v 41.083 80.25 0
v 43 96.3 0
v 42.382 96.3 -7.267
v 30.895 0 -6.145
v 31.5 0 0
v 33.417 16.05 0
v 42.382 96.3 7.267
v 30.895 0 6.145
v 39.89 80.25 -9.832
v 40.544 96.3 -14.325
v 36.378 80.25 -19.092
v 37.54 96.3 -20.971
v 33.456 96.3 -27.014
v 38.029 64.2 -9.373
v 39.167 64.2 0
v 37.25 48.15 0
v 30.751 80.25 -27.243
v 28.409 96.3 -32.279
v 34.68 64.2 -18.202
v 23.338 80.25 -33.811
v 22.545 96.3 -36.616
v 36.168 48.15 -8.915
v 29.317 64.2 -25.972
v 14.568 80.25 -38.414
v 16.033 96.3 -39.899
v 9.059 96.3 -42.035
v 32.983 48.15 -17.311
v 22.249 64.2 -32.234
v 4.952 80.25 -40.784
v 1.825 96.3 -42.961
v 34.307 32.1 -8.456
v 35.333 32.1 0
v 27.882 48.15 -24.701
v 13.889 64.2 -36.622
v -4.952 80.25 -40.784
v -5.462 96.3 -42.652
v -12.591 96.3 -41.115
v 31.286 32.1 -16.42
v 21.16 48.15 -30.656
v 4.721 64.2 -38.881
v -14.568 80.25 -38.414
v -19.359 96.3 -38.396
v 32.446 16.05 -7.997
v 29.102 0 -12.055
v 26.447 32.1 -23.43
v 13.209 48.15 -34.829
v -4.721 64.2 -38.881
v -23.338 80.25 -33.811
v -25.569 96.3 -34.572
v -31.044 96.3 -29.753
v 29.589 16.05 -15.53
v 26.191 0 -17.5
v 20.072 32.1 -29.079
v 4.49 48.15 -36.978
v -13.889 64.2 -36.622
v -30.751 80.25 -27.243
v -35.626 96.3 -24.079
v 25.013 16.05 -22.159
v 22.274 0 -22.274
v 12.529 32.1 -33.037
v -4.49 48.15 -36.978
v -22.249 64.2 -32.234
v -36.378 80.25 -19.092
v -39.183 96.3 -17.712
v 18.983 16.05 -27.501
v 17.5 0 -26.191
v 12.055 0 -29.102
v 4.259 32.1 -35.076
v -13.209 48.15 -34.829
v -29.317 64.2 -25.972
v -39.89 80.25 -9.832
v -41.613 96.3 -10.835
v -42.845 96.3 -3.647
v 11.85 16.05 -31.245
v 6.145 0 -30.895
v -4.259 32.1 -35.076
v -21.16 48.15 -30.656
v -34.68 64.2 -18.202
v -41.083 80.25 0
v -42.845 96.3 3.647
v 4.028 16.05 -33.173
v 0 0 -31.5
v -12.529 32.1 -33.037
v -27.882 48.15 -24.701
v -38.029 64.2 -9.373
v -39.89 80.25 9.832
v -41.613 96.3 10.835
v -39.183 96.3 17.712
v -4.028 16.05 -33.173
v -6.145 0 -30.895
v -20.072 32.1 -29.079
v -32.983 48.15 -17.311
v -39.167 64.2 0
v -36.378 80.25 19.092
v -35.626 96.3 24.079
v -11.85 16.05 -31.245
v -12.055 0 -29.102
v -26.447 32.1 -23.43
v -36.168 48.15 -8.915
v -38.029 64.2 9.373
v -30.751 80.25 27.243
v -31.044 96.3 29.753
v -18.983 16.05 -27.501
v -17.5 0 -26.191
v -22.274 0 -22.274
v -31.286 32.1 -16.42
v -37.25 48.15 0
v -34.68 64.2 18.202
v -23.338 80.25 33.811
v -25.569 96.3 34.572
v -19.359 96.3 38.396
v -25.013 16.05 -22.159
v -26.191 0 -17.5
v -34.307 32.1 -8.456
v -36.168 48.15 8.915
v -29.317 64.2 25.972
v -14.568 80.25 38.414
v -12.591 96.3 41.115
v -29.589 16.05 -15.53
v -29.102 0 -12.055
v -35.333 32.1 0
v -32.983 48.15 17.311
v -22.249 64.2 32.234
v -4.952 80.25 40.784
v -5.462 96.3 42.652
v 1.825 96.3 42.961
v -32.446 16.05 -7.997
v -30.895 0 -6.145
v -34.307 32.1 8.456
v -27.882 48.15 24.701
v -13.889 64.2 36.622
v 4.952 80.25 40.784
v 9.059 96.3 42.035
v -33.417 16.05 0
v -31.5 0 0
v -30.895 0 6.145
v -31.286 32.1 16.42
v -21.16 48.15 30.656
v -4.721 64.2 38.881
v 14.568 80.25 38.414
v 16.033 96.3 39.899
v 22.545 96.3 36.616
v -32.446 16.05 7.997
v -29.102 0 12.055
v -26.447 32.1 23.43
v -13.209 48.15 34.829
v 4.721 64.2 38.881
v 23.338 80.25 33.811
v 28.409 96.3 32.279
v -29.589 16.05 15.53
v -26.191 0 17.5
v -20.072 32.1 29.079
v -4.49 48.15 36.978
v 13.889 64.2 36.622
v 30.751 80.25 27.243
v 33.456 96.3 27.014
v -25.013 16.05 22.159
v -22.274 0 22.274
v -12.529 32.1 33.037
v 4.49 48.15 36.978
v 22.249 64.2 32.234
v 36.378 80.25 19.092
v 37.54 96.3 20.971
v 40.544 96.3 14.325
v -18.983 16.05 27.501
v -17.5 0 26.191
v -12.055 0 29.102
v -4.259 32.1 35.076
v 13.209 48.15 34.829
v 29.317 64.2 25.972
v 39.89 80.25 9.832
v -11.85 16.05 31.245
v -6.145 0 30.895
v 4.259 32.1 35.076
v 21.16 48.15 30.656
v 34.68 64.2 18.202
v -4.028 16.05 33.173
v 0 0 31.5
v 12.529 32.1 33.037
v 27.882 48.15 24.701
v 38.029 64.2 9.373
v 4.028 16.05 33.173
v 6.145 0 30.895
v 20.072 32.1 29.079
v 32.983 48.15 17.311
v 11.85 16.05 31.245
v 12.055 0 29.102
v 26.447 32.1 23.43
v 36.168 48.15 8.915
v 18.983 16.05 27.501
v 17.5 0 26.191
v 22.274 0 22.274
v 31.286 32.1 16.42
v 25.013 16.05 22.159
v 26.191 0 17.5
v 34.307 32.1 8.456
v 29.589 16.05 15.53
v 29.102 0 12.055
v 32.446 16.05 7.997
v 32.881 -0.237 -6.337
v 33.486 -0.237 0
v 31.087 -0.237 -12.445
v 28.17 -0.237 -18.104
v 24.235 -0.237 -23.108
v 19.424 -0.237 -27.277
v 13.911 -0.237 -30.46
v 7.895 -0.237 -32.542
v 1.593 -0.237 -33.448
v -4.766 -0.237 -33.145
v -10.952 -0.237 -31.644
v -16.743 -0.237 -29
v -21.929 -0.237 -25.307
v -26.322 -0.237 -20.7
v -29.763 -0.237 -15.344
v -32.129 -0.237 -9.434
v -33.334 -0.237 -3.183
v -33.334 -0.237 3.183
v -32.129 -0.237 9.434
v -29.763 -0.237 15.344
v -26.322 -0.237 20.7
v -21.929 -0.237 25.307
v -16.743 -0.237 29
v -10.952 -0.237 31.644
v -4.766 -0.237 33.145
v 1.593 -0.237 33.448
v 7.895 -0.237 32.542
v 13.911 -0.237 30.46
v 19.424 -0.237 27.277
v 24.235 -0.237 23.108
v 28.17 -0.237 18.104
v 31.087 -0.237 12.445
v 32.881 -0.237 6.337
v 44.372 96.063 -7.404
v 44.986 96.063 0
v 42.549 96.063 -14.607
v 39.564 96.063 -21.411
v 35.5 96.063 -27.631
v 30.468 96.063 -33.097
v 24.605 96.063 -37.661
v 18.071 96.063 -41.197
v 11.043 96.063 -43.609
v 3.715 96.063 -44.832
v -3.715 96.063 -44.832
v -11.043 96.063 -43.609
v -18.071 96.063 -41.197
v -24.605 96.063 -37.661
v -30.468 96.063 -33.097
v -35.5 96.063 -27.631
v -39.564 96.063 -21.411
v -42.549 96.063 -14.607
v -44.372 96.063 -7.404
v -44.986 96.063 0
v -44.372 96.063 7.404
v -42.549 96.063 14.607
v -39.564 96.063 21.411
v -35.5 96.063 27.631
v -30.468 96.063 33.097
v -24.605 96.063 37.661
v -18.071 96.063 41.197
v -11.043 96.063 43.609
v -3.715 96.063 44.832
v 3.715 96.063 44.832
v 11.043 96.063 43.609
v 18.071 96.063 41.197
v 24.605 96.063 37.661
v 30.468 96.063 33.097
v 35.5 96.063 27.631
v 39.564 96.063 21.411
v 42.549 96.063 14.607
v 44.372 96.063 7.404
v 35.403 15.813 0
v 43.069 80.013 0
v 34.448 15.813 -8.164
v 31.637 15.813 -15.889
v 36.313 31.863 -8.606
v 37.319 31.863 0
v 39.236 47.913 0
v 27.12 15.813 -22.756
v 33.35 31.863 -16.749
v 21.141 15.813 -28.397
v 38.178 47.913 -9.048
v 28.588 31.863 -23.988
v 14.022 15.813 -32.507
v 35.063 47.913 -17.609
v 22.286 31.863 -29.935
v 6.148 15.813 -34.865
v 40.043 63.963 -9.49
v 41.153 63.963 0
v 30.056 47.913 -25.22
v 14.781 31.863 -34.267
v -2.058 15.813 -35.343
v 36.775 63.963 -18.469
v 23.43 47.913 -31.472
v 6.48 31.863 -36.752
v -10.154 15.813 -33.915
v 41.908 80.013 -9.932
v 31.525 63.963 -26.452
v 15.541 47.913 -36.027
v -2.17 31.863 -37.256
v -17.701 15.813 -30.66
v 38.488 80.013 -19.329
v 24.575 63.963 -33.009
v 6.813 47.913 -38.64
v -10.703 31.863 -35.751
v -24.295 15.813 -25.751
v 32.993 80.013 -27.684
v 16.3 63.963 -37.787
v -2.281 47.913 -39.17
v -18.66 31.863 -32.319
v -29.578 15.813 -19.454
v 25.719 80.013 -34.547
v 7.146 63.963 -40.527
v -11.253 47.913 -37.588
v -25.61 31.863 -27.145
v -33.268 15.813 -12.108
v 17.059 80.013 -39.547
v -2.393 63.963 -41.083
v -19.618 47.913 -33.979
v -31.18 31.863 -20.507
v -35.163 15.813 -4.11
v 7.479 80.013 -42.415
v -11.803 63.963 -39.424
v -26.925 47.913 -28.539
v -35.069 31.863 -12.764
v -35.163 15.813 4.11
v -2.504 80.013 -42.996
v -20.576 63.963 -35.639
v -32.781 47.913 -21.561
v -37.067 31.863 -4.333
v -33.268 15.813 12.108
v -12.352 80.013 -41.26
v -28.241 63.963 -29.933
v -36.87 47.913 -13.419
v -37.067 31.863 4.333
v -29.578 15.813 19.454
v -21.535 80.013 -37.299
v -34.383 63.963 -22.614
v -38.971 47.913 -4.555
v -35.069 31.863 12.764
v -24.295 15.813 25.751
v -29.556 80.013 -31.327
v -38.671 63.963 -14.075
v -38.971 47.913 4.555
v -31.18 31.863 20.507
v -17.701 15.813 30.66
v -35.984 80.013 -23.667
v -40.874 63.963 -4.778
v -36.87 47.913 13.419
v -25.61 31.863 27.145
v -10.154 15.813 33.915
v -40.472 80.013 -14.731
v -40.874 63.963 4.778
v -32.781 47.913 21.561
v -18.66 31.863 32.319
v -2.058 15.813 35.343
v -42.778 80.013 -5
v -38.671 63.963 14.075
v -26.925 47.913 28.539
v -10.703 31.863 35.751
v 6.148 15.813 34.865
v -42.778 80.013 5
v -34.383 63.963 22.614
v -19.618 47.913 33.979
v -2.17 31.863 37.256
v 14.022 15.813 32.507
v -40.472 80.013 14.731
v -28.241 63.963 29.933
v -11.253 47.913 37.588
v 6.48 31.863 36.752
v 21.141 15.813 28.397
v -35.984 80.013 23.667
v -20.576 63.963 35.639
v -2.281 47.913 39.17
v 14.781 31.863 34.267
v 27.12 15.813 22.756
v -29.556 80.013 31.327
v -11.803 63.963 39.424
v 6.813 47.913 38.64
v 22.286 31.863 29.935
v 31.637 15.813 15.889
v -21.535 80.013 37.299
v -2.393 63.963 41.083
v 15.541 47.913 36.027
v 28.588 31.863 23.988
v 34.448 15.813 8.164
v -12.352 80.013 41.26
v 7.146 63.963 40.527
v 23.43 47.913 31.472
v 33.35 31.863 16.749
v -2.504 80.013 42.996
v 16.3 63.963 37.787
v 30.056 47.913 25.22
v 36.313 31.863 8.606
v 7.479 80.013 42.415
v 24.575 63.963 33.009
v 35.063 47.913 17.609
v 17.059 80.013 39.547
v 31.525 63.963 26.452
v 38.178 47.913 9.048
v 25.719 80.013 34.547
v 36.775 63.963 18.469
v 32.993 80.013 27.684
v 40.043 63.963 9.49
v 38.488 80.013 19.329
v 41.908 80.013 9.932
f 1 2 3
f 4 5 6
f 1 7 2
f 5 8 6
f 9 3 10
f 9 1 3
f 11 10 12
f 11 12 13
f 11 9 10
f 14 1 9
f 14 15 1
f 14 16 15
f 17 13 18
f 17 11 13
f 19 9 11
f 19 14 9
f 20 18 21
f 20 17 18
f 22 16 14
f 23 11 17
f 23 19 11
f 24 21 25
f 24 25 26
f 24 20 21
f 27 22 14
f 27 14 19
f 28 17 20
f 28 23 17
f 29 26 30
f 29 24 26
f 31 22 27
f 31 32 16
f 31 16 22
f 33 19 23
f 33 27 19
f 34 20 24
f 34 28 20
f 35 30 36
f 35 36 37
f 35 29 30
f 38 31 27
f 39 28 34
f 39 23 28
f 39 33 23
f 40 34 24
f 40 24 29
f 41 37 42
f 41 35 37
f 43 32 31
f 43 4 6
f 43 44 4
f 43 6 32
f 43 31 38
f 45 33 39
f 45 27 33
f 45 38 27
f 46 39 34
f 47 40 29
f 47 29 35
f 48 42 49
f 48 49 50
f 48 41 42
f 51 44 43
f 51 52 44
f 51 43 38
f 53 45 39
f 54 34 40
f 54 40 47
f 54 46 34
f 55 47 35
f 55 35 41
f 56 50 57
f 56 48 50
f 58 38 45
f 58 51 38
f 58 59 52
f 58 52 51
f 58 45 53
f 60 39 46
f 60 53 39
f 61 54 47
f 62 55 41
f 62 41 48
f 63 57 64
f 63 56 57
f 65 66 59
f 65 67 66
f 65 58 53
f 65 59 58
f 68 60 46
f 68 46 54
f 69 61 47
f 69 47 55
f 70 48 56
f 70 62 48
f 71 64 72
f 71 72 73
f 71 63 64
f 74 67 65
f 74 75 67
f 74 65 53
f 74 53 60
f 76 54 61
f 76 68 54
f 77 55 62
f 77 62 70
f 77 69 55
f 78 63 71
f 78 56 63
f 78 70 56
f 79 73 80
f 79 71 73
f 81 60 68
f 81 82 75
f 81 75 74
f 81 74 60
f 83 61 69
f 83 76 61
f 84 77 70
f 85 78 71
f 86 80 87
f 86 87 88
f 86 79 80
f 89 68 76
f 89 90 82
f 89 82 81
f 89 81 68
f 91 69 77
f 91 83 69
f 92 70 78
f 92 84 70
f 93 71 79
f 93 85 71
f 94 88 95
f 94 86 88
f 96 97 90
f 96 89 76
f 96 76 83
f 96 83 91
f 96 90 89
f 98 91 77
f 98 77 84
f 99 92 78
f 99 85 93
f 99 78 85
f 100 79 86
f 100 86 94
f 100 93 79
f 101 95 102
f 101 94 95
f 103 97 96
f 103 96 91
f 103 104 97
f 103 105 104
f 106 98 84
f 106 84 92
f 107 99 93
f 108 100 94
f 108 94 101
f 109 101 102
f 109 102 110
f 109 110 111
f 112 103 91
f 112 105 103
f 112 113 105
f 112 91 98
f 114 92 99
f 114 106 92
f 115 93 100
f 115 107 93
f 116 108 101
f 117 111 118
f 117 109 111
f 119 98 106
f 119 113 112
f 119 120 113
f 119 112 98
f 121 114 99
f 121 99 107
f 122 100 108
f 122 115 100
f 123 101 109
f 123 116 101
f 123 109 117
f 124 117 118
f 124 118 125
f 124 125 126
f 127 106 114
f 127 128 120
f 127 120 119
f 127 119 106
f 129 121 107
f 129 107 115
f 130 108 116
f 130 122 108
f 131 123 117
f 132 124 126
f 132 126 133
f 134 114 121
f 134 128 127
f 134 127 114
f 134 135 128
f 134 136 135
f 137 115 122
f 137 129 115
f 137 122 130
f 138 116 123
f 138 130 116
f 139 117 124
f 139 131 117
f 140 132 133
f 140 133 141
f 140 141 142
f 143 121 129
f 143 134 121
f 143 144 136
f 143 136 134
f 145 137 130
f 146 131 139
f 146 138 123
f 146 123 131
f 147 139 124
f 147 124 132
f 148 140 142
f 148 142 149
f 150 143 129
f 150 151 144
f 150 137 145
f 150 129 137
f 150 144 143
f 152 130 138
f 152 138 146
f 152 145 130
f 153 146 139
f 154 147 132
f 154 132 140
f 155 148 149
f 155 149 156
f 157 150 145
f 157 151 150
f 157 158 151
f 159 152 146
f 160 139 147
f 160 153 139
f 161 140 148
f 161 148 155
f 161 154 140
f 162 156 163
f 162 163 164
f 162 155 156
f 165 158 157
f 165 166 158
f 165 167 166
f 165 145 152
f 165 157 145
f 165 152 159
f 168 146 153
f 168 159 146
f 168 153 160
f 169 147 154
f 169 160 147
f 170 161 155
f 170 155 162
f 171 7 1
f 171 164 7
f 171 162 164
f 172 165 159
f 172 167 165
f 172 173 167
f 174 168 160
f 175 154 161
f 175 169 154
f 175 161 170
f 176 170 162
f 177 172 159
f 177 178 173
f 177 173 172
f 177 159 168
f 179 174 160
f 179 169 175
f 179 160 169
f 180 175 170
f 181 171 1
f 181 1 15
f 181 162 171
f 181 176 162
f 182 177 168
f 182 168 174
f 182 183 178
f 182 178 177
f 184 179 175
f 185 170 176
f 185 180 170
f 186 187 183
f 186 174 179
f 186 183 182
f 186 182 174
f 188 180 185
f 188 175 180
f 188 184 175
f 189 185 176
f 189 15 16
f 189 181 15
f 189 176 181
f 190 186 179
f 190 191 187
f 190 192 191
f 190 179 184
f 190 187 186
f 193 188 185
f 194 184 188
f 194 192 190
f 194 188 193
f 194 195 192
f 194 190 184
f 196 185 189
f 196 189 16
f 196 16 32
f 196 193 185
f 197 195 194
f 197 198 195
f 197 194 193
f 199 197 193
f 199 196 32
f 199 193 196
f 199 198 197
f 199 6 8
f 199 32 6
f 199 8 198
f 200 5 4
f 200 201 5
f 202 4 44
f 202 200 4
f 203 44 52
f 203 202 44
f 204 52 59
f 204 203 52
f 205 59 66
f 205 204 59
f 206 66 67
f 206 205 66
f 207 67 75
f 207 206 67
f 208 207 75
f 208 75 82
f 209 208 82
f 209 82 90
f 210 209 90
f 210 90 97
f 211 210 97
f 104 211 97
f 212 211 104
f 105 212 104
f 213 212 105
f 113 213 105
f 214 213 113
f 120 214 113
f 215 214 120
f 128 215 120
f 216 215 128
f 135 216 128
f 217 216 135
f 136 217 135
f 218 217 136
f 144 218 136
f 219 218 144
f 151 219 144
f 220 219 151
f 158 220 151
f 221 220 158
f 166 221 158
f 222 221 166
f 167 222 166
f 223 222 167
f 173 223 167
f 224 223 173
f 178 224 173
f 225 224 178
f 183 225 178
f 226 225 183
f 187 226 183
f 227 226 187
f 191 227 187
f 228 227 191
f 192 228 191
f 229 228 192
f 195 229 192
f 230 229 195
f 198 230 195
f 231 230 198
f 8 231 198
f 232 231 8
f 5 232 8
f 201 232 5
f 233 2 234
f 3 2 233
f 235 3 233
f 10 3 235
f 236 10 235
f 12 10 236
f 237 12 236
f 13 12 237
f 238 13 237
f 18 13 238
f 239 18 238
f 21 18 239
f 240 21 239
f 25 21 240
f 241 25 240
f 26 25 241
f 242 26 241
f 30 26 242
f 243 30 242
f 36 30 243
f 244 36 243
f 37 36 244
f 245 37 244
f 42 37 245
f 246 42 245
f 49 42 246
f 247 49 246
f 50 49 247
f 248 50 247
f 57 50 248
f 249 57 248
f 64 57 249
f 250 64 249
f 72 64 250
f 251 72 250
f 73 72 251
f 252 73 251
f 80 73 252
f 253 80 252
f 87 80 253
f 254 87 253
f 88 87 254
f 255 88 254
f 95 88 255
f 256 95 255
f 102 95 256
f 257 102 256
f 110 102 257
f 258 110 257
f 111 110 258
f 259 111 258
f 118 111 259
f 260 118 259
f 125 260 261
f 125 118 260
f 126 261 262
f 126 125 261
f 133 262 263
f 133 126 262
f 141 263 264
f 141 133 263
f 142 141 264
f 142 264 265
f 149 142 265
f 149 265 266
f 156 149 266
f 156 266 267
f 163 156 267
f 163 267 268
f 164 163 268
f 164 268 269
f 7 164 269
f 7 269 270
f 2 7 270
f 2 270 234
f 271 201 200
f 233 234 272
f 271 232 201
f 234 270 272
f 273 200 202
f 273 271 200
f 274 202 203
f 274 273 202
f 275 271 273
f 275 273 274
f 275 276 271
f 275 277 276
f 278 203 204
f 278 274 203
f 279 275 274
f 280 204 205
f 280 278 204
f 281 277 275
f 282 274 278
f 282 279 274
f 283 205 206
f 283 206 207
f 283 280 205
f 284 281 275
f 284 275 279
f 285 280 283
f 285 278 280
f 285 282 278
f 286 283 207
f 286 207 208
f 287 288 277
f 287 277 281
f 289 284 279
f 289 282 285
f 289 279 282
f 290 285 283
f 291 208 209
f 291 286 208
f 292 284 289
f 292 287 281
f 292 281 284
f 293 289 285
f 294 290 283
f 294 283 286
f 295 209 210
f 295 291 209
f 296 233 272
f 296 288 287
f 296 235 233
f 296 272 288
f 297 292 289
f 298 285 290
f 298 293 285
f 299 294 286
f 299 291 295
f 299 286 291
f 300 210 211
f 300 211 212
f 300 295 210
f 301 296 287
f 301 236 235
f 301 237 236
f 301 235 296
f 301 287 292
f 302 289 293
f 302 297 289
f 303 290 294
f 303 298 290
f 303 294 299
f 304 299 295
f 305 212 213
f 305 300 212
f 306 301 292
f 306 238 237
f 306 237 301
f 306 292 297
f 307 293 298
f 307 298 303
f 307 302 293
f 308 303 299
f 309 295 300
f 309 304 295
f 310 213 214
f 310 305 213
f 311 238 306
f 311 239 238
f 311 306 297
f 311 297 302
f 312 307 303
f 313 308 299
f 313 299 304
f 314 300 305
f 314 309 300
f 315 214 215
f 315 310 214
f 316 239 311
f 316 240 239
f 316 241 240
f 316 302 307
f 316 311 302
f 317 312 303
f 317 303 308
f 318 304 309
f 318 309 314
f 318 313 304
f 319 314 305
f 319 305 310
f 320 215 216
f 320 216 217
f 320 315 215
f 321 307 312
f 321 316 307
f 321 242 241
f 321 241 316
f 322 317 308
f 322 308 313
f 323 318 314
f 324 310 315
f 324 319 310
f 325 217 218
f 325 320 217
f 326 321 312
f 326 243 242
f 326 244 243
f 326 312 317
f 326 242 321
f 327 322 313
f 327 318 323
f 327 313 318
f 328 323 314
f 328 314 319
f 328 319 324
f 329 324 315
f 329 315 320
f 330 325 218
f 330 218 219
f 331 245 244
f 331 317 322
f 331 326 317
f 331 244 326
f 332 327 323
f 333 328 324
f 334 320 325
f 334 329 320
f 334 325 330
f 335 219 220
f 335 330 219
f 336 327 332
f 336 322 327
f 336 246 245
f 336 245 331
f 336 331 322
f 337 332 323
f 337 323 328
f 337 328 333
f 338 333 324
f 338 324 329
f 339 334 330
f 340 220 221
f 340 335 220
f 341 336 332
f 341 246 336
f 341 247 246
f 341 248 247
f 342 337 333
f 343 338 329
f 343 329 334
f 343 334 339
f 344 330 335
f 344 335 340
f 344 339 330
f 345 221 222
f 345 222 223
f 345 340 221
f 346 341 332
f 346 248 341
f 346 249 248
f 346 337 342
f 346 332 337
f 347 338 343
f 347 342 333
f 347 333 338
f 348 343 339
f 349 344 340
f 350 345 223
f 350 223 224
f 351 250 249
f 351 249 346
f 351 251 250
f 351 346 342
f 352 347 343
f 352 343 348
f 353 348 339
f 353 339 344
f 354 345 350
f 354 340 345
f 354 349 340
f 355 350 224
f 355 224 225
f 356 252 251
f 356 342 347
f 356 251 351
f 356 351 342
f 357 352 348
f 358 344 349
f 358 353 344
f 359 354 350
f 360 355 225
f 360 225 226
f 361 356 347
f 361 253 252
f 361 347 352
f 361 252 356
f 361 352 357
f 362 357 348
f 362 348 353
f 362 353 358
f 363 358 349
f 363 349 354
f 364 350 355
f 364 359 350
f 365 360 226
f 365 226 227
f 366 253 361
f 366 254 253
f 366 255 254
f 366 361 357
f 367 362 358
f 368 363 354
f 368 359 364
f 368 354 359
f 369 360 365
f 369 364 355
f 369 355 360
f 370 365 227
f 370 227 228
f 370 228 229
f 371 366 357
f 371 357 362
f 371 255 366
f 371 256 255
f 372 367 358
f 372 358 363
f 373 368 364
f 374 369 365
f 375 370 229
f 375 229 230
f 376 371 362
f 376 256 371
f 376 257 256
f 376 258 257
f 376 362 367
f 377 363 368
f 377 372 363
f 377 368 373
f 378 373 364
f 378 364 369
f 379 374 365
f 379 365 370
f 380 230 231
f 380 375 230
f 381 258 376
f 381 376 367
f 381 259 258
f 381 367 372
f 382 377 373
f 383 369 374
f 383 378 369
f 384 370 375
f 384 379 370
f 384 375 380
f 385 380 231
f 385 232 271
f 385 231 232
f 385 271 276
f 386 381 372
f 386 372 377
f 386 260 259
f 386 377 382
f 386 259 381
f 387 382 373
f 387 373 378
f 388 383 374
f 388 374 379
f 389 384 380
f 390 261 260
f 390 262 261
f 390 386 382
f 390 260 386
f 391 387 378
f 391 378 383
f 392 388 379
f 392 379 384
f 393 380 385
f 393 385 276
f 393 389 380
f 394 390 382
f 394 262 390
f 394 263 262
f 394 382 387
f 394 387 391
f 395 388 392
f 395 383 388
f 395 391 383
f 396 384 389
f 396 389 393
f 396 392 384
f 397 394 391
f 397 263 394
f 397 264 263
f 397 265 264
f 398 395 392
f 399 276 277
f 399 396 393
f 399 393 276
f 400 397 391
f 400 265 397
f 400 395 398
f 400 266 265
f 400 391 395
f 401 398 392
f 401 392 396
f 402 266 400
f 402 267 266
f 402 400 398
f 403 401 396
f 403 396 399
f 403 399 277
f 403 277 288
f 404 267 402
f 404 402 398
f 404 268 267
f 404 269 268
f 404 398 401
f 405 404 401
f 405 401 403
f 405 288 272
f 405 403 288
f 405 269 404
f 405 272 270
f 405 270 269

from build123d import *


# Read off the part's stored shape, not the designer's step: Thicken1
with BuildPart() as part:
    # Thicken1 outline → Thicken1 (revolve)
    with BuildSketch(Plane.XY):
        Polygon((43.000126639, 96.3), (31.5, 0), (33.485889655, -0.237154543), (44.986016294, 96.062845457), align=None)
    revolve(axis=Axis((0, 0, 0), (0, 1, 0)))


solid = part.part
